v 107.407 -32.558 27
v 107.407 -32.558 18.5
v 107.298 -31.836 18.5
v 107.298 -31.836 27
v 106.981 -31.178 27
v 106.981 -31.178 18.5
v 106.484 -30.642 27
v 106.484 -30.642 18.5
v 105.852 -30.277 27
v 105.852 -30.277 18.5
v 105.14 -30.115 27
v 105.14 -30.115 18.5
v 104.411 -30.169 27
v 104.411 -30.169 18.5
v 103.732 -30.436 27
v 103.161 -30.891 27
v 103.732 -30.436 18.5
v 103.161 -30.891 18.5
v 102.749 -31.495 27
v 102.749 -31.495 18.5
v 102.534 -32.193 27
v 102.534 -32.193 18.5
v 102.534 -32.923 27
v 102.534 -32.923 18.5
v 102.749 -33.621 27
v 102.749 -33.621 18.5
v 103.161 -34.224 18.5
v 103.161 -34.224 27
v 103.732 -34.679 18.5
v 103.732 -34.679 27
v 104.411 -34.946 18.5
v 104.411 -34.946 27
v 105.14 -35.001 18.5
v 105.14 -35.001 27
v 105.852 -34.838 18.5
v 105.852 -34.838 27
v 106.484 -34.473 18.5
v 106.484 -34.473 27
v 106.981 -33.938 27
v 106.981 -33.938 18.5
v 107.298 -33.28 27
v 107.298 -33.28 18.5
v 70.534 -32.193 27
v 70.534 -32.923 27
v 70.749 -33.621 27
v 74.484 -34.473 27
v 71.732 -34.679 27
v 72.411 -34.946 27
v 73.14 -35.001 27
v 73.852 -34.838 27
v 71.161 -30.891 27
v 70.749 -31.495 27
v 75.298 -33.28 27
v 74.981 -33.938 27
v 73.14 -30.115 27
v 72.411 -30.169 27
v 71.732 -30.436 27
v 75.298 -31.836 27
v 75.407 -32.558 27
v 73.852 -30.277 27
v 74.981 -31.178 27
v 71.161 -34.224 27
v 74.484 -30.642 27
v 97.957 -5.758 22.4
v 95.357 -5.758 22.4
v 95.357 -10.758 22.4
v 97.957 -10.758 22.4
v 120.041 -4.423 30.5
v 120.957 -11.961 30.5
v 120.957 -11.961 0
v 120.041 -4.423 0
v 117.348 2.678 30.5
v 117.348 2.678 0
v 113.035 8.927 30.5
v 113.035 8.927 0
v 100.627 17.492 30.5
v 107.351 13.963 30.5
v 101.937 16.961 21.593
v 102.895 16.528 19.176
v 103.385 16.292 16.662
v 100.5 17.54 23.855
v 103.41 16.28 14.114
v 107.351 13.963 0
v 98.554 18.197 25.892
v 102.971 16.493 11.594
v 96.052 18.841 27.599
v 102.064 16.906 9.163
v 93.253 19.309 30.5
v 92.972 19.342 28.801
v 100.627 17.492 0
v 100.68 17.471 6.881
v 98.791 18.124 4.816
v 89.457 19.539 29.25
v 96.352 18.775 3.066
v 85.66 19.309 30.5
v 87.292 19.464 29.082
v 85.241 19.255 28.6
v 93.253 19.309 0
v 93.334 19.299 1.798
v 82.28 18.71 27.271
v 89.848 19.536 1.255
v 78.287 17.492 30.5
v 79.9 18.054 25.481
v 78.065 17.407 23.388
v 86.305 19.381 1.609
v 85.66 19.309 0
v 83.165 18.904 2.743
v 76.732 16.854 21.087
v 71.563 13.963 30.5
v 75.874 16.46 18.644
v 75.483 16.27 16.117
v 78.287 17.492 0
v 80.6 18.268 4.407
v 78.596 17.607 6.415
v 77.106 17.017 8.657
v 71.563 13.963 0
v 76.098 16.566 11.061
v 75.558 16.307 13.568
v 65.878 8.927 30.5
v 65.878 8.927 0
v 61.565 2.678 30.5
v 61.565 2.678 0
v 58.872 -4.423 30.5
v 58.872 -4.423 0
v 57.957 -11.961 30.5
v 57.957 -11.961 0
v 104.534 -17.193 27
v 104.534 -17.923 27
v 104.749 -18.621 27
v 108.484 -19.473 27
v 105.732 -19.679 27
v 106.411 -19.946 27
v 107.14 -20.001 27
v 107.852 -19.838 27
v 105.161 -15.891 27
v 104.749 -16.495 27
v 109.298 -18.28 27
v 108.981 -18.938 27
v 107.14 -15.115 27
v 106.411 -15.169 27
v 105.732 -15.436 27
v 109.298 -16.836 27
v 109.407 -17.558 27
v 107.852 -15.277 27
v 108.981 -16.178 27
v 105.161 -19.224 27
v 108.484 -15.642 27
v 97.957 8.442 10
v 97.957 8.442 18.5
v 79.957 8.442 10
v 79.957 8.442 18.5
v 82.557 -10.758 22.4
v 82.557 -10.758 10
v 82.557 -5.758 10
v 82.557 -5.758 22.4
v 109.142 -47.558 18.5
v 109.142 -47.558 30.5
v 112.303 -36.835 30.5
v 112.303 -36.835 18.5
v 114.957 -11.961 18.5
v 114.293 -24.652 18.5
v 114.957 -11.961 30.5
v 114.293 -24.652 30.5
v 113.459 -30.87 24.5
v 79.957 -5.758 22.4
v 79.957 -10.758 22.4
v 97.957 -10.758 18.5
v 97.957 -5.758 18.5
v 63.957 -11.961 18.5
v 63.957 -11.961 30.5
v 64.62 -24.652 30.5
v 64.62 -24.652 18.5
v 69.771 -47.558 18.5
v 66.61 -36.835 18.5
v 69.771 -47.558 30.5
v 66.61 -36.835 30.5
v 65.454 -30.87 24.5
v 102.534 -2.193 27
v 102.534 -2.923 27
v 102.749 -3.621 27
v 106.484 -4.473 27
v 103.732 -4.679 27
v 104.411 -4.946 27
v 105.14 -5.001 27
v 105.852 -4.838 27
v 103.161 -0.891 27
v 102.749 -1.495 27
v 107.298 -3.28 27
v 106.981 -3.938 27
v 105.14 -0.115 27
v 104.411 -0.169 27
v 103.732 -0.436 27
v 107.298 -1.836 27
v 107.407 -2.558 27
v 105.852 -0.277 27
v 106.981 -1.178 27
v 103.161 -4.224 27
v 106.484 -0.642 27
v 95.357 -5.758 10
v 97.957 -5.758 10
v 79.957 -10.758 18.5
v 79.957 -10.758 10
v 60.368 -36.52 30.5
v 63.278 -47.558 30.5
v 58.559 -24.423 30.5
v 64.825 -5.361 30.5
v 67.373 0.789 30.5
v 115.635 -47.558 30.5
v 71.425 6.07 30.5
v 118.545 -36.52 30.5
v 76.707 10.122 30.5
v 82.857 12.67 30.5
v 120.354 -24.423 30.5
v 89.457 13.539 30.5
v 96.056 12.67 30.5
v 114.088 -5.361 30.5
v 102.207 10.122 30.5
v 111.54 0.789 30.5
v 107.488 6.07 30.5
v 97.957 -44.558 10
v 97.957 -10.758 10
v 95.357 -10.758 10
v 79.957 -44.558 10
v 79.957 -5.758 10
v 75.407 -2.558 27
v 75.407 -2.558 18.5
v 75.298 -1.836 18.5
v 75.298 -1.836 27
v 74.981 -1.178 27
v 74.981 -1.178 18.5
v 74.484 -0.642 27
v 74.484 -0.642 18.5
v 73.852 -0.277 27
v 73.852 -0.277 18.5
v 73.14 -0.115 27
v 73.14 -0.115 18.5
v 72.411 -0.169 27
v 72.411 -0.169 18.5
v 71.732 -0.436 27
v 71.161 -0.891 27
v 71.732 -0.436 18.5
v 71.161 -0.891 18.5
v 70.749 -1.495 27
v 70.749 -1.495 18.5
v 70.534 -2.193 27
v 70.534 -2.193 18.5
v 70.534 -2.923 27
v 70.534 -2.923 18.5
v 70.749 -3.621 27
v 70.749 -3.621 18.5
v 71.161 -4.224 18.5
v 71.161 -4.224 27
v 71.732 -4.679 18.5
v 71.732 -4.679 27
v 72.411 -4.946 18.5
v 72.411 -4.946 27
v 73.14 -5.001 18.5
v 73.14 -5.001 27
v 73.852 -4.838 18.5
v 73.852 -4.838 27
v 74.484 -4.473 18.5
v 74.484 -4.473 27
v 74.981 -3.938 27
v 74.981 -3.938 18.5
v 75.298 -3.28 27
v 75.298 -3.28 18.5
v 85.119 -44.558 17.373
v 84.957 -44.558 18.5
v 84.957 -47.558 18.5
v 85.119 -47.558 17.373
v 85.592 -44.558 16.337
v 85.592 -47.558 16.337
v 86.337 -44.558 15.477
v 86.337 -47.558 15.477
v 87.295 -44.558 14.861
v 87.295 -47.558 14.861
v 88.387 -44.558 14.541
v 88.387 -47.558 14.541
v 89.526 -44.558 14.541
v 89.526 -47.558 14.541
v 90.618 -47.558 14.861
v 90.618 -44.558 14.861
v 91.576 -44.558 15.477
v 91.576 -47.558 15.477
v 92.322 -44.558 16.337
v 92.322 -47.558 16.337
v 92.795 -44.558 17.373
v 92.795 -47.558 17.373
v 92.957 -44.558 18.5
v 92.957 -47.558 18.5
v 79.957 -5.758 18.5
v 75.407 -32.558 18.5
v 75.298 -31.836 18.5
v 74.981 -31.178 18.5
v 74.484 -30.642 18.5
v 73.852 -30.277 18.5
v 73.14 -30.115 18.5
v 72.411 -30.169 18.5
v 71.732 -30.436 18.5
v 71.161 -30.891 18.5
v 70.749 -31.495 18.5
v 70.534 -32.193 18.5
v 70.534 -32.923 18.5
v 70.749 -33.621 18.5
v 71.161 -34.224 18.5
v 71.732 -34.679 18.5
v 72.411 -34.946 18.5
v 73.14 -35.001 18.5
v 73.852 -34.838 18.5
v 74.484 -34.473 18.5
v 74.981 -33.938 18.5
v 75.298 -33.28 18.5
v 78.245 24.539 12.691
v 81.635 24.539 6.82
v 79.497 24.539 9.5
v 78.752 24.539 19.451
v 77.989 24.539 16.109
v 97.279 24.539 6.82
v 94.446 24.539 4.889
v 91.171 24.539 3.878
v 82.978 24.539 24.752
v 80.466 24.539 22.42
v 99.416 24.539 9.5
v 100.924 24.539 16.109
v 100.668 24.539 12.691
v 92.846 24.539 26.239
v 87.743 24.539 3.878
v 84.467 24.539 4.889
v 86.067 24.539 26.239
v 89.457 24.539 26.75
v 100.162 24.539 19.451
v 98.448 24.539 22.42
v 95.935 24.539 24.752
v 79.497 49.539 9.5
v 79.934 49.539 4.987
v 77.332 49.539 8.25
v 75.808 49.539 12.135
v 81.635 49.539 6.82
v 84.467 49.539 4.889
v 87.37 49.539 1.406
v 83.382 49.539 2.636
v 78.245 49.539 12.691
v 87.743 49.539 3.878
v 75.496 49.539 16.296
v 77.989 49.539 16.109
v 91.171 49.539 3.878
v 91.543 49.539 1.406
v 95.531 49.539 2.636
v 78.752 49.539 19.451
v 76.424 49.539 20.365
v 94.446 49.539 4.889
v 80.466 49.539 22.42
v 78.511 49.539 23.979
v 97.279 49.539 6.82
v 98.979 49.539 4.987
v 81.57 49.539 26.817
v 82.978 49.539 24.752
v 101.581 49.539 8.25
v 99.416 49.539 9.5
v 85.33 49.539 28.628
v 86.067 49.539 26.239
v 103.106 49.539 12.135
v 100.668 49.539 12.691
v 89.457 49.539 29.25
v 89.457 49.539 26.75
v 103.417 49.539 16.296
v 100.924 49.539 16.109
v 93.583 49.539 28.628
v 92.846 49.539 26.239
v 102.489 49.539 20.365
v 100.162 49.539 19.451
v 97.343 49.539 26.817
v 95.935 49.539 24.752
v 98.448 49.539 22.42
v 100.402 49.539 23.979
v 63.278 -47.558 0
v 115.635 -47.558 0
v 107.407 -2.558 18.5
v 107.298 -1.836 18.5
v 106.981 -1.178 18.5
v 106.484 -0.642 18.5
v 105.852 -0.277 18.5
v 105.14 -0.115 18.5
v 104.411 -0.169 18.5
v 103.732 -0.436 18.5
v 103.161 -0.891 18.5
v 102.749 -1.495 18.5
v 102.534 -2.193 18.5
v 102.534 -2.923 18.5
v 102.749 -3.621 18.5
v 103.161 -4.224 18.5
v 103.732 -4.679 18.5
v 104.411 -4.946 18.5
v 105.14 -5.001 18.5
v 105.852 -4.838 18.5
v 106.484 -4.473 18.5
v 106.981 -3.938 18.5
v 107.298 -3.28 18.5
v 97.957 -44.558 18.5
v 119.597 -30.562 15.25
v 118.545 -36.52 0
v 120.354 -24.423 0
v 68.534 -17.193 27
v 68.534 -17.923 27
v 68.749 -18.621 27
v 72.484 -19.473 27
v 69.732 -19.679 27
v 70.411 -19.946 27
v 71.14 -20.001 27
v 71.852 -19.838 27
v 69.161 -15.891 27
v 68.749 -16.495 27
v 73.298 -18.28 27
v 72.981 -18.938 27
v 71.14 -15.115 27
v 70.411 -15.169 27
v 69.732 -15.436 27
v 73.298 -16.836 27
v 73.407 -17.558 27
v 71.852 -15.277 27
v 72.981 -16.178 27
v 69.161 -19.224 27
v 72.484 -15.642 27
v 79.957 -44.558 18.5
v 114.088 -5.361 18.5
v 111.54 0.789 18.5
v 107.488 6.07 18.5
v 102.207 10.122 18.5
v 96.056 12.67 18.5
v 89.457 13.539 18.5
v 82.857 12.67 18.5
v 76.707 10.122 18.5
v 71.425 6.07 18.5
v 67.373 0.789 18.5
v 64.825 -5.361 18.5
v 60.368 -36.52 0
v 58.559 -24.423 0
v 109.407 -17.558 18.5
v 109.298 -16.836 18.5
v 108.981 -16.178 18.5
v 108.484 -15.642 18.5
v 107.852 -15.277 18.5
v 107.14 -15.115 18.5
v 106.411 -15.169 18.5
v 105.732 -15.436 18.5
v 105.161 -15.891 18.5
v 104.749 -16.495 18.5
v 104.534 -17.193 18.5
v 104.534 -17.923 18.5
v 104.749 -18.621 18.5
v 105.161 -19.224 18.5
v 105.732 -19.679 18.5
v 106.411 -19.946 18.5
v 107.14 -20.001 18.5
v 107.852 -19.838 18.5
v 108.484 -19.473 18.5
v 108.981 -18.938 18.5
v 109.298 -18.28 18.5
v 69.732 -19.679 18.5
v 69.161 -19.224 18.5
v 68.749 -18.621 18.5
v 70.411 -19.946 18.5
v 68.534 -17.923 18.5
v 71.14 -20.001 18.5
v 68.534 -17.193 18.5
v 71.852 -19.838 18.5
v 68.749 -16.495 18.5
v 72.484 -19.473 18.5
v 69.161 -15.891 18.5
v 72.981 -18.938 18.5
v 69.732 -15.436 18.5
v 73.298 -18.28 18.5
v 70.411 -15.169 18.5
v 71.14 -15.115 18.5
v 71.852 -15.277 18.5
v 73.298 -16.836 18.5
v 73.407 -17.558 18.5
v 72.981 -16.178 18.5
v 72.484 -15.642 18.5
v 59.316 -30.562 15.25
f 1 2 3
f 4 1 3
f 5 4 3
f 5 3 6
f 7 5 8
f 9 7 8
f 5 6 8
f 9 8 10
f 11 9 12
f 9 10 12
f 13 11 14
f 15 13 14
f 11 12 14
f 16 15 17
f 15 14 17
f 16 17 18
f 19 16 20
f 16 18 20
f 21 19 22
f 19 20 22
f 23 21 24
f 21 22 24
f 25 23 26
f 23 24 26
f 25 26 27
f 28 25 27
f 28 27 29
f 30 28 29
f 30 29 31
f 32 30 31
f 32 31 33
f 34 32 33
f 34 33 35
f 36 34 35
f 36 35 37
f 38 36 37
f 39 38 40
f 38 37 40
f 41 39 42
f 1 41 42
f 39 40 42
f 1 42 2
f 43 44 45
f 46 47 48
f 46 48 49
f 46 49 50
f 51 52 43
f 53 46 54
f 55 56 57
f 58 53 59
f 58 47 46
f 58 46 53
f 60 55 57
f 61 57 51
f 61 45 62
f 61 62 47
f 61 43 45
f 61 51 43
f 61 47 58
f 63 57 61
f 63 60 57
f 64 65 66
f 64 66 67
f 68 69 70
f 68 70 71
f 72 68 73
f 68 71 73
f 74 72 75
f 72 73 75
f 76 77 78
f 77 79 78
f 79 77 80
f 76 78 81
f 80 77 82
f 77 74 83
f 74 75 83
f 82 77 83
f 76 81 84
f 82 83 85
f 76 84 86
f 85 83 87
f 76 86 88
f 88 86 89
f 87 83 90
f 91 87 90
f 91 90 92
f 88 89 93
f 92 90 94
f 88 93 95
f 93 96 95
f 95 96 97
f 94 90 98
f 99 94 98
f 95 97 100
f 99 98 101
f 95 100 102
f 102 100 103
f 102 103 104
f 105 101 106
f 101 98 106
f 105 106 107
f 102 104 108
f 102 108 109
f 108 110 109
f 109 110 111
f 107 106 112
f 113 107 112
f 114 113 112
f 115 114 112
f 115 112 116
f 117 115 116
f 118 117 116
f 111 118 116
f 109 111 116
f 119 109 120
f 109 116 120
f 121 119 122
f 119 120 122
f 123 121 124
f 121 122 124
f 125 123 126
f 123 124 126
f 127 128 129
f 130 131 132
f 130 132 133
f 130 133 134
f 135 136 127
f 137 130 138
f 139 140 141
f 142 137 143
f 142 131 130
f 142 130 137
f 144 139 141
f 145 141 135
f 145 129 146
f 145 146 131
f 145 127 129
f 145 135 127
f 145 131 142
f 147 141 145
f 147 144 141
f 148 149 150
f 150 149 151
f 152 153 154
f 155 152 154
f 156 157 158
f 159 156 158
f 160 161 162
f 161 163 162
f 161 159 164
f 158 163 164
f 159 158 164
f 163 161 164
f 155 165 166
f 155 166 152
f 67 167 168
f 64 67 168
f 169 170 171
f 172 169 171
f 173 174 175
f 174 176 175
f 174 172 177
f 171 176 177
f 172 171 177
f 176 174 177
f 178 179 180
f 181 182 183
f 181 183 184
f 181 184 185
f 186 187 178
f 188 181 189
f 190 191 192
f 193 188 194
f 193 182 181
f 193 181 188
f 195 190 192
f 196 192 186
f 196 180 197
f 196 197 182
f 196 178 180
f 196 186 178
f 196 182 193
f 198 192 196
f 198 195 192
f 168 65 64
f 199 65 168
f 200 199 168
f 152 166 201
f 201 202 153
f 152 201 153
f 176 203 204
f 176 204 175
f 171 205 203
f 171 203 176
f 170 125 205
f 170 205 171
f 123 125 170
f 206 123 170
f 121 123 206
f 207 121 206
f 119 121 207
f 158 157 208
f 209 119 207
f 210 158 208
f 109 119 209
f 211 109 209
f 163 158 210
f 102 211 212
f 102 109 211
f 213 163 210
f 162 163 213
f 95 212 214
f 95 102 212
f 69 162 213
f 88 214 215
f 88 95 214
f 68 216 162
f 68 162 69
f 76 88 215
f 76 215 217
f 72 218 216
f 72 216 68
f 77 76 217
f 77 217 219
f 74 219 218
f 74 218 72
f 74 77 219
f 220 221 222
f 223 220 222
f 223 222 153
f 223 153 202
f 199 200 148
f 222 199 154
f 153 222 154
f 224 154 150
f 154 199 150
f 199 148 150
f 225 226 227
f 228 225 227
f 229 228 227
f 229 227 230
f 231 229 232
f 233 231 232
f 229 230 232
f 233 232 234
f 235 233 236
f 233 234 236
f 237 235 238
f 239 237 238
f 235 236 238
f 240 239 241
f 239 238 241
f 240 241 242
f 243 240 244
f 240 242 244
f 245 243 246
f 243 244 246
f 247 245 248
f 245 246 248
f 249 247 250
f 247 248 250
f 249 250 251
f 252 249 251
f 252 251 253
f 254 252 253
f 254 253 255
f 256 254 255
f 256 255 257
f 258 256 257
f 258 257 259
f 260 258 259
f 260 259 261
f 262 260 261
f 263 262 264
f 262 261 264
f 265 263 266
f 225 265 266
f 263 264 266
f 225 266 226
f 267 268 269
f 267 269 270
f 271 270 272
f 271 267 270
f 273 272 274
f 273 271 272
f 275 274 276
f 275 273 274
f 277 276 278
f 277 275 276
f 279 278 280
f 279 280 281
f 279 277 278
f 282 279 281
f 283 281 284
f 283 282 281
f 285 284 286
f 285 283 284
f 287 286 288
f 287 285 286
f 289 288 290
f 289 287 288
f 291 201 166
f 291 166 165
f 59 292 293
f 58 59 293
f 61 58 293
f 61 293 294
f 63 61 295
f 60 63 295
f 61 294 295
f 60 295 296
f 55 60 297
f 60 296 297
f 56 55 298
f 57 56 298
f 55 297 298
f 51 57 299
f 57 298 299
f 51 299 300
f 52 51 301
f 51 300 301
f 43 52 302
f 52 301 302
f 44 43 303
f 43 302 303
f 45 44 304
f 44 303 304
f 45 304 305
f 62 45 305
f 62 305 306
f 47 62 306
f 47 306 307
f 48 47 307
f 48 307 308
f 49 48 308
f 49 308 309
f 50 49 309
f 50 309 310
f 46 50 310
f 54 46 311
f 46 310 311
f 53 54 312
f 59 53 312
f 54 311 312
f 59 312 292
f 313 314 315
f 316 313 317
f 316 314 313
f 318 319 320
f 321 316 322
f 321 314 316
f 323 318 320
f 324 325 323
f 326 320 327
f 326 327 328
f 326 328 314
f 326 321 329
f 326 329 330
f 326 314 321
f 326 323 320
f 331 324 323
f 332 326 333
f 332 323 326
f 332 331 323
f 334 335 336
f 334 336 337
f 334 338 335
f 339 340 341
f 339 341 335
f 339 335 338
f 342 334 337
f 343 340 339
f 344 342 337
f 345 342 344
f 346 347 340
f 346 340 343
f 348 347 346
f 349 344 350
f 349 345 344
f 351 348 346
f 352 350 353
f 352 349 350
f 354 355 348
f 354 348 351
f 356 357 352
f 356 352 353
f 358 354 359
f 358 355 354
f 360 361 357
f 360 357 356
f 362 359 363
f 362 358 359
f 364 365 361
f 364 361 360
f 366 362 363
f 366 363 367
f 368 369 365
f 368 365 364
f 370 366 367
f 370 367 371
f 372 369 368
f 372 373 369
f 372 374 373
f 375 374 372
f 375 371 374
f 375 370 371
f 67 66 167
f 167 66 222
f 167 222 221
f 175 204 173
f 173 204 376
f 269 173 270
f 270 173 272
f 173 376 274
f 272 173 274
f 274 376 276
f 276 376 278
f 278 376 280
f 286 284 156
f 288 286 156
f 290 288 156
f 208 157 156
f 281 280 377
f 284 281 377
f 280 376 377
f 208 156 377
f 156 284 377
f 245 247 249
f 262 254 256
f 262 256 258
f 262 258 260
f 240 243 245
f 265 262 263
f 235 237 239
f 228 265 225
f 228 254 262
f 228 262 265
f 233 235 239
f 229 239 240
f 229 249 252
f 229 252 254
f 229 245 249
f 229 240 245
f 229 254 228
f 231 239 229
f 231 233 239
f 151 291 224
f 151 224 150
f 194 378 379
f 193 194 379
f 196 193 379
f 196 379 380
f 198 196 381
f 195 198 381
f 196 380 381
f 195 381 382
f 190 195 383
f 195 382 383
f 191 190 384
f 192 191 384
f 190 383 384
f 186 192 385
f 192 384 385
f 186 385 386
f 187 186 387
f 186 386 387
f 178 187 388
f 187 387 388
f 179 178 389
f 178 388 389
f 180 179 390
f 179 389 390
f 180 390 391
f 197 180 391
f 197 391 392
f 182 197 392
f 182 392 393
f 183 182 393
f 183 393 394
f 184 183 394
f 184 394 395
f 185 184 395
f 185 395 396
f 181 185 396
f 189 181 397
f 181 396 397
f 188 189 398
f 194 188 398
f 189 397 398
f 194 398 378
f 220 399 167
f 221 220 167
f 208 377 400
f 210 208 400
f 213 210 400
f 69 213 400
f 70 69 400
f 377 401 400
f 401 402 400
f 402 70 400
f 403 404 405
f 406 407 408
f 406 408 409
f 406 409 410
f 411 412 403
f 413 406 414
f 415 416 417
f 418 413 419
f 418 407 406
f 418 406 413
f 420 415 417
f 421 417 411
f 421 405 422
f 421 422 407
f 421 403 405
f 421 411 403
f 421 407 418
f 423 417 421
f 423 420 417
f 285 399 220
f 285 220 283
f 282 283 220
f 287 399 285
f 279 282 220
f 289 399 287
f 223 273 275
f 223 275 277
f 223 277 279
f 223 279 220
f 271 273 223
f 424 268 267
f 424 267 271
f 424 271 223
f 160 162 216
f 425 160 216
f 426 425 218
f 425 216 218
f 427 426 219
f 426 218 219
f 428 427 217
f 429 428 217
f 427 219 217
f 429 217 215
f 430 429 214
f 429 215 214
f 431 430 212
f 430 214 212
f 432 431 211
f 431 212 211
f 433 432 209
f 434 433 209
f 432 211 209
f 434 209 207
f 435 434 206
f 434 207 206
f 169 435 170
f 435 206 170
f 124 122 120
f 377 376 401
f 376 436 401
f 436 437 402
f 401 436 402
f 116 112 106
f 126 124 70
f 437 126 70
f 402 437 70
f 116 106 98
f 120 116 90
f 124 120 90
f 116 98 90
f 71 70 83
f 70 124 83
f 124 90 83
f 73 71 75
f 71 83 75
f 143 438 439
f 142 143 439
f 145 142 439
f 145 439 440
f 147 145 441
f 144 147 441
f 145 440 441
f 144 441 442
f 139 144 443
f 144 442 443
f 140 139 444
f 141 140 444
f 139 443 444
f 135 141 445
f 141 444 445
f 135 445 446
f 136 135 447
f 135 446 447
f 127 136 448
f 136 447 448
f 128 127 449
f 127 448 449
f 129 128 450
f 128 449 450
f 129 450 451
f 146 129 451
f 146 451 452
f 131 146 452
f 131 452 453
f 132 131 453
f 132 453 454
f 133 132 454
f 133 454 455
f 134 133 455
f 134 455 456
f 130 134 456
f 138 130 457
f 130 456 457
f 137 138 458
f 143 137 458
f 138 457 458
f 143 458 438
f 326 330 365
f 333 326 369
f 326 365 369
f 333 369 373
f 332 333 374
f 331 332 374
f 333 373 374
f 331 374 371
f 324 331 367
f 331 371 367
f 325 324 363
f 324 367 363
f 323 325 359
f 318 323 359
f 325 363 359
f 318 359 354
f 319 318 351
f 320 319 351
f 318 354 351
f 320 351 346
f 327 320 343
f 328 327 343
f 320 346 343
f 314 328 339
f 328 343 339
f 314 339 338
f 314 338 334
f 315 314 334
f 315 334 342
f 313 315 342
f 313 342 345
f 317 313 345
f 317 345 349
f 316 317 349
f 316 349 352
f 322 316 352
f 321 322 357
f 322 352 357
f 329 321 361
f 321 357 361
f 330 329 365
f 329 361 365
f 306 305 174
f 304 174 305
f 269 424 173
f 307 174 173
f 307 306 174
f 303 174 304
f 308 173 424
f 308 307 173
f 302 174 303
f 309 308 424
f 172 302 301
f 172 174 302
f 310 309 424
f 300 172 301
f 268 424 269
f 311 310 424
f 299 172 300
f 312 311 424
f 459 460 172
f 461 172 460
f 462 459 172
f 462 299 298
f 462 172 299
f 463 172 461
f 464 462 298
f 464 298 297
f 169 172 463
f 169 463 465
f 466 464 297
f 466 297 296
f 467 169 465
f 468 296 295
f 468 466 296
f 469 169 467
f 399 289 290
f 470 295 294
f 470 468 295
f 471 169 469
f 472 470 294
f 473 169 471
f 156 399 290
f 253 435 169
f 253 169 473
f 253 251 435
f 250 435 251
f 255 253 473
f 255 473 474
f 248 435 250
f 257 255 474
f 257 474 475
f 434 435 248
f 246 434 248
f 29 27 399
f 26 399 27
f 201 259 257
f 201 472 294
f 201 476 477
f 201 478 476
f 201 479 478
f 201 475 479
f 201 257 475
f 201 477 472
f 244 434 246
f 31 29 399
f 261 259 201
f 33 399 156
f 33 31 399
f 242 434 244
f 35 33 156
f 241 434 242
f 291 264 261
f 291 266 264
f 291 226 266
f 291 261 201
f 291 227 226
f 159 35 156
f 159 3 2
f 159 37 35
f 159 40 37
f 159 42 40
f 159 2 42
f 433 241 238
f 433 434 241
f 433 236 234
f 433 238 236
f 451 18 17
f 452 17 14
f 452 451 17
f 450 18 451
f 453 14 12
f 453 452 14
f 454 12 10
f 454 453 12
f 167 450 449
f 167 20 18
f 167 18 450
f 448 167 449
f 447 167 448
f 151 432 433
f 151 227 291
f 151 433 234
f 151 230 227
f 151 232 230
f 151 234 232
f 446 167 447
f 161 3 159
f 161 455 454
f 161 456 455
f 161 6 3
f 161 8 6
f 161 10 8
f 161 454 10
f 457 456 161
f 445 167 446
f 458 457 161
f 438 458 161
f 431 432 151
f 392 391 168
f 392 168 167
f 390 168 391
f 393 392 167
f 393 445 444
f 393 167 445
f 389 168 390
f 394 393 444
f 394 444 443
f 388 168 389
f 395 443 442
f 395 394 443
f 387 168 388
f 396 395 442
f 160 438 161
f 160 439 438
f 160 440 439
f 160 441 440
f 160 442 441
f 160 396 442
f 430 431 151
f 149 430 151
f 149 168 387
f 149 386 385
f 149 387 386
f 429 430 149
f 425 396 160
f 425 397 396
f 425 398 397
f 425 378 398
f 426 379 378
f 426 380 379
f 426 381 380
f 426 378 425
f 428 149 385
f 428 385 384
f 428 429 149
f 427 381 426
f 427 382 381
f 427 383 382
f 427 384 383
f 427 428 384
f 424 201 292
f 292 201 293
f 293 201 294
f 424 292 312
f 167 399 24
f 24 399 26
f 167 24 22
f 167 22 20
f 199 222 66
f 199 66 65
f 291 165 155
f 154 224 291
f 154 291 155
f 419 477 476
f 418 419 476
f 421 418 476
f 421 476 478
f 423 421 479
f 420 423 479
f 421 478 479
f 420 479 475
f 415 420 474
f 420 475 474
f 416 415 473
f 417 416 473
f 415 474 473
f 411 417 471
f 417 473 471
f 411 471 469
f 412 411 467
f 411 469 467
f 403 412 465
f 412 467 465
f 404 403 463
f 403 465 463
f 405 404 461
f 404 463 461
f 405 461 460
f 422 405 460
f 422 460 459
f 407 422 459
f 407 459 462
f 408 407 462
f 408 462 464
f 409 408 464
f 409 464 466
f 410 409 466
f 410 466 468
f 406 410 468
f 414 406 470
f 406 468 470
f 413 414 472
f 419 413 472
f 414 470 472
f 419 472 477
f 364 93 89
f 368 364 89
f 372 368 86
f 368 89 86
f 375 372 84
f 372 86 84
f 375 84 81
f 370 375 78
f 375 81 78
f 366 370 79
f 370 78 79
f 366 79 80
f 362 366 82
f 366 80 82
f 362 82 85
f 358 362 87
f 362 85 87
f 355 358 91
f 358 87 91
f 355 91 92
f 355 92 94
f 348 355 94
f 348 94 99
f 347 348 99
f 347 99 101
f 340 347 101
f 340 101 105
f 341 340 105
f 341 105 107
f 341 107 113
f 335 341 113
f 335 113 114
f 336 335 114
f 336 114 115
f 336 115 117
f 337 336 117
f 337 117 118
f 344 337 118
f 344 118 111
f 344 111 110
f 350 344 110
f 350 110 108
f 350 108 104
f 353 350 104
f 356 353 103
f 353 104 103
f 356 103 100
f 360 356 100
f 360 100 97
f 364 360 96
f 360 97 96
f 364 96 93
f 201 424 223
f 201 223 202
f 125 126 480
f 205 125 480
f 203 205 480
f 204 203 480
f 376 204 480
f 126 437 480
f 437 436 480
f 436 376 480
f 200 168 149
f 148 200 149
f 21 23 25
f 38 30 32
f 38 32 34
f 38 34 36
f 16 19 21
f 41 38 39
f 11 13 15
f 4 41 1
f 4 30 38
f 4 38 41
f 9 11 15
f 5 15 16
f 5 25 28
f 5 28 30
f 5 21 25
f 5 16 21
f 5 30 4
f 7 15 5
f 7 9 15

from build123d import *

# Parameters (mm, degrees)
SALIENTE_EXTRUIR2_DEPTH      = 30.5
CROQUIS14_R                  = 25.5
CORTAR_EXTRUIR1_DEPTH        = 12
SALIENTE_EXTRUIR3_DEPTH      = 30
SALIENTE_EXTRUIR3_DEPTH_BACK = 4
CROQUIS15_R                  = 14
CROQUIS16_R                  = 11.5
CORTAR_EXTRUIR2_DEPTH        = 25
SKETCH1_W                    = 18
SKETCH1_H                    = 53
CUT_EXTRUDE1_DEPTH           = 8.5
SKETCH2_R                    = 4
CUT_EXTRUDE2_DEPTH           = 3
SKETCH3_R                    = 2.45
BOSS_EXTRUDE1_DEPTH          = 8.5
SKETCH4_W                    = 2.6
SKETCH4_H                    = 5
BOSS_EXTRUDE2_DEPTH          = 12.4


with BuildPart() as part:
    # Croquis13 → Saliente-Extruir2 (new body)
    with BuildSketch(Plane.XY):
        with BuildLine():
            Line((63.278452832, -47.557716663), (115.634697867, -47.557716663))
            add(Edge.make_bspline(
                [(115.634697867, -47.557716663), (120.956575349, -31.401681318), (120.956575349, -11.961207195)],
                knots=[0.980995561, 0.980995561, 0.980995561, 1.570796327, 1.570796327, 1.570796327], degree=2, weights=[1, 0.9568311, 1]))
            ThreePointArc((120.956575349, -11.961207195), (89.456575349, 19.538792805), (57.956575349, -11.961207195))
            add(Edge.make_bspline(
                [(57.956575349, -11.961207195), (57.956575349, -31.401681318), (63.278452832, -47.557716663)],
                knots=[4.71238898, 4.71238898, 4.71238898, 5.302189747, 5.302189747, 5.302189747], degree=2, weights=[1, 0.9568311, 1]))
        make_face()
    extrude(amount=SALIENTE_EXTRUIR2_DEPTH)

    # Croquis14 → Cortar-Extruir1 (cut)
    with BuildSketch(Plane.XY.offset(30.5)):
        with Locations((89.456575349, -11.961207195)):
            Circle(CROQUIS14_R)
        with BuildLine():
            add(Edge.make_bspline(
                [(109.141957532, -47.557716663), (114.956575349, -32.049805489), (114.956575349, -11.961207195)],
                knots=[4.023536226, 4.023536226, 4.023536226, 4.71238898, 4.71238898, 4.71238898], degree=2, weights=[1, 0.941269295, 1]))
            ThreePointArc((114.956575349, -11.961207195), (89.456575349, -37.461207195), (63.956575349, -11.961207195))
            add(Edge.make_bspline(
                [(63.956575349, -11.961207195), (63.956575349, -32.049805489), (69.771193166, -47.557716663)],
                knots=[1.570796327, 1.570796327, 1.570796327, 2.259649081, 2.259649081, 2.259649081], degree=2, weights=[1, 0.941269295, 1]))
            Line((69.771193166, -47.557716663), (109.141957532, -47.557716663))
        make_face()
    extrude(amount=-CORTAR_EXTRUIR1_DEPTH, mode=Mode.SUBTRACT)

    # Croquis15 → Saliente-Extruir3 (add, two sides: drawn at the far end of the back side and taken through both)
    with BuildSketch(Plane(origin=(89.456575349, 19.538792805, 30.5), x_dir=(1, 0, 0), z_dir=(0, 1, 0)).offset(-SALIENTE_EXTRUIR3_DEPTH_BACK)):
        with Locations(Location((0, 15.25, 0), (0, 0, 270))):
            Circle(CROQUIS15_R)
    extrude(amount=SALIENTE_EXTRUIR3_DEPTH + SALIENTE_EXTRUIR3_DEPTH_BACK)

    # Croquis16 → Cortar-Extruir2 (cut)
    with BuildSketch(Plane(origin=(0, 49.538792805, 0), x_dir=(1, 0, 0), z_dir=(0, 1, 0))):
        with Locations(Location((89.456575349, -15.25, 0), (0, 0, 270))):
            Circle(CROQUIS16_R)
    extrude(amount=-CORTAR_EXTRUIR2_DEPTH, mode=Mode.SUBTRACT)

    # Sketch1 → Cut-Extrude1 (cut)
    with BuildSketch(Plane(origin=(0, -29.057716663, 18.5), x_dir=(-1, 0, 0), z_dir=(0, 0, -1))):
        with Locations((-88.956575349, 11)):
            Rectangle(SKETCH1_W, SKETCH1_H)
    extrude(amount=CUT_EXTRUDE1_DEPTH, mode=Mode.SUBTRACT)

    # Sketch2 → Cut-Extrude2 (cut)
    with BuildSketch(Plane.XZ.offset(44.557716663)):
        with Locations((88.956575349, 18.5)):
            Circle(SKETCH2_R)
    extrude(amount=CUT_EXTRUDE2_DEPTH, mode=Mode.SUBTRACT)

    # Sketch3 → Boss-Extrude1 (add)
    with BuildSketch(Plane.XY.offset(18.5)):
        with Locations((104.956575349, -32.557716663)):
            Circle(SKETCH3_R)
        with Locations((104.956575349, -2.557716663)):
            Circle(SKETCH3_R)
        with Locations((70.956575349, -17.557716663)):
            Circle(SKETCH3_R)
        with Locations((106.956575349, -17.557716663)):
            Circle(SKETCH3_R)
        with Locations((72.956575349, -32.557716663)):
            Circle(SKETCH3_R)
        with Locations((72.956575349, -2.557716663)):
            Circle(SKETCH3_R)
    extrude(amount=BOSS_EXTRUDE1_DEPTH)

    # Sketch4 → Boss-Extrude2 (add)
    with BuildSketch(Plane.XY.offset(10)):
        with Locations((81.256575349, -8.257716663)):
            Rectangle(SKETCH4_W, SKETCH4_H)
        with Locations((96.656575349, -8.257716663)):
            Rectangle(SKETCH4_W, SKETCH4_H)
    extrude(amount=BOSS_EXTRUDE2_DEPTH)


solid = part.part
